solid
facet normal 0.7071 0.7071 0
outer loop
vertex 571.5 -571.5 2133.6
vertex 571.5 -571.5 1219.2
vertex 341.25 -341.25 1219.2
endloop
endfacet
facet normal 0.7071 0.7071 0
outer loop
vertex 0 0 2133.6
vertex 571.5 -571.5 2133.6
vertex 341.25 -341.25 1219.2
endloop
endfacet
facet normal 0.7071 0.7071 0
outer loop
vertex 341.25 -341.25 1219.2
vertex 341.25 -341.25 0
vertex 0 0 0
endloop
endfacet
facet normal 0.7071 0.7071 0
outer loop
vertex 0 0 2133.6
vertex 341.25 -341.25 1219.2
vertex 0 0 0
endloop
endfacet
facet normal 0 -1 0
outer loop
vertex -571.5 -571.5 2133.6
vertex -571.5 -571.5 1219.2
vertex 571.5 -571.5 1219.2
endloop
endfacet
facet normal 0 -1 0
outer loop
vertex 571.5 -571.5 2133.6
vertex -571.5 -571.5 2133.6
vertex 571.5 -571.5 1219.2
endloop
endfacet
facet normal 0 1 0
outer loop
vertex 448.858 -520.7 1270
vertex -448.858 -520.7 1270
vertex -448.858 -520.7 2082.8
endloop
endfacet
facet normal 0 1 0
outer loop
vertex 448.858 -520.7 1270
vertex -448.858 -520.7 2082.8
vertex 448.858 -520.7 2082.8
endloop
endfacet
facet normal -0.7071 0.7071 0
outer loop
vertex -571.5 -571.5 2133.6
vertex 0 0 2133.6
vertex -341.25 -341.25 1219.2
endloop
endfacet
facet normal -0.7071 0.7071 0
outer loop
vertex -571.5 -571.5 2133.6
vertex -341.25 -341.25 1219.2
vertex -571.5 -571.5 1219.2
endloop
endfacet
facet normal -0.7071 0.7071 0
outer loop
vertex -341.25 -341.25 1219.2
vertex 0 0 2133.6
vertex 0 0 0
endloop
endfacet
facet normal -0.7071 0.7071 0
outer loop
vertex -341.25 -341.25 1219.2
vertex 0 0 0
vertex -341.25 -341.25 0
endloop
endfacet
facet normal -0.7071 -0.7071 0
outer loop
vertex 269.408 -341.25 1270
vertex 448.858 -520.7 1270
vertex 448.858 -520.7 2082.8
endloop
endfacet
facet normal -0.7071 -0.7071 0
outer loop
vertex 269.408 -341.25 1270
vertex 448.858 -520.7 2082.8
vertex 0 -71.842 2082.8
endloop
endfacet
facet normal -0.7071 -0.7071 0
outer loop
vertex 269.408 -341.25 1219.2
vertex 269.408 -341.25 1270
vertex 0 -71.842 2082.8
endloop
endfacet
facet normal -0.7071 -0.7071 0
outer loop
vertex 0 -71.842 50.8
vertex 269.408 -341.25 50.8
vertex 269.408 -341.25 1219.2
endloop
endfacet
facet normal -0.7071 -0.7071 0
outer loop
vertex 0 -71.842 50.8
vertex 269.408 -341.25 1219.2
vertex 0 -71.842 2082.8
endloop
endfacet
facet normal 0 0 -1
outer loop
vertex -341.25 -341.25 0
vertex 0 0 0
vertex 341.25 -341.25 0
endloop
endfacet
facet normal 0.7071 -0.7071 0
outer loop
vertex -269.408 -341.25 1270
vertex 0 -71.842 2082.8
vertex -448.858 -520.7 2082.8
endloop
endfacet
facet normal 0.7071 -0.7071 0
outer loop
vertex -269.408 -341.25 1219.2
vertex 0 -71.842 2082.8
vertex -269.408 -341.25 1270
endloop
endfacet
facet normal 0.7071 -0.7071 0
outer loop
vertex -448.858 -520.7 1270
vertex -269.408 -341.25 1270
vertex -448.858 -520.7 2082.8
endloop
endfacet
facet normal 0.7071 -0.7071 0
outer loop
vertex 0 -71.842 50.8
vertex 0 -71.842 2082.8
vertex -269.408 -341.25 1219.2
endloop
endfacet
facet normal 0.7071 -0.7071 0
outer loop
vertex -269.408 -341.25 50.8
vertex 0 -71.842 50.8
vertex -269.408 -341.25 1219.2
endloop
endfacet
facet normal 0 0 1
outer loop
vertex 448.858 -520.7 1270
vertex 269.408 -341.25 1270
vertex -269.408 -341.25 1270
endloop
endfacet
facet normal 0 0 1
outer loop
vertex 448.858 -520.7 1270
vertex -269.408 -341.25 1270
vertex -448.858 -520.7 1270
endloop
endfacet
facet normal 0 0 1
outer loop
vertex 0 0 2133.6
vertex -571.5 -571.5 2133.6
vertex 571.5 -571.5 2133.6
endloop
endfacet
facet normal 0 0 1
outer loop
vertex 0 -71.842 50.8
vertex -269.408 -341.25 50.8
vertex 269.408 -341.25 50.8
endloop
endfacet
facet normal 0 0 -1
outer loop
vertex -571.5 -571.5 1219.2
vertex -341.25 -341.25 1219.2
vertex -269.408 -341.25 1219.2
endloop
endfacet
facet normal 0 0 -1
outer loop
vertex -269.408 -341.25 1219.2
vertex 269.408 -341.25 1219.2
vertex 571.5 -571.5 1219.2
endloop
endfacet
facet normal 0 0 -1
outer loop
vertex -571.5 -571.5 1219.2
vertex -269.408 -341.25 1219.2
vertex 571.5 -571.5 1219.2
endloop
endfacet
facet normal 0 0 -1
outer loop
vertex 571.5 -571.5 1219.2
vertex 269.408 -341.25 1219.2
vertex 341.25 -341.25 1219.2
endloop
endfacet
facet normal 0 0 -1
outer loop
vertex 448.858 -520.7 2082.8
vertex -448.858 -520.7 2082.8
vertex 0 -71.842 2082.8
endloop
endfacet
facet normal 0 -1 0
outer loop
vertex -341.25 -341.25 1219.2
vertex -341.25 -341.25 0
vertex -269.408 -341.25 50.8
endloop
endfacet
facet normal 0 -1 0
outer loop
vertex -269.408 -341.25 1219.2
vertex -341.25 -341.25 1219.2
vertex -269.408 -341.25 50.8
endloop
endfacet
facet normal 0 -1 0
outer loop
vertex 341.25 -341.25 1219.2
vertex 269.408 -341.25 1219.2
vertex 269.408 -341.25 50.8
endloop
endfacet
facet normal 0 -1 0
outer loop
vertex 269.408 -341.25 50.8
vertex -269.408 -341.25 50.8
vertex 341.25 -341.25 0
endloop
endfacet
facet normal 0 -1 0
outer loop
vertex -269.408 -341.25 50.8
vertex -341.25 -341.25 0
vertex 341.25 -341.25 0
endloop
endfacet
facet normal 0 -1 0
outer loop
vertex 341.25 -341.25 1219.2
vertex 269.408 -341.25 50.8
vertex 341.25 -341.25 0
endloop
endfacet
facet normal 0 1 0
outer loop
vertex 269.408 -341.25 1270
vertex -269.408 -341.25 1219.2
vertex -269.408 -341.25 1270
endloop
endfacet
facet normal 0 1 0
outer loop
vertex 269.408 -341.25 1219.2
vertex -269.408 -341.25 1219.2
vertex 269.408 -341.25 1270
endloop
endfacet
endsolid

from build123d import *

# Parameters (mm, degrees)
F1_DEPTH = 1219.2
F3_DEPTH = 914.4
F4_T     = 50.8


# Not quite as in the source:
# - a shell that OpenCascade refuses in one call is made with other operations: the cavity is built on its own and cut out


with BuildPart() as f1:
    # F0 (on Top) → F1 (new body)
    with BuildSketch(Plane.XY):
        Polygon((0, 0), (-341.2497326006, -341.2497326006), (341.2497326006, -341.2497326006), align=None)
    extrude(amount=F1_DEPTH)

    # F2 (on face) → F3 (join)
    with BuildSketch(Plane.XY.offset(1219.2)):
        Polygon((341.2497326006, -341.2497326006), (0, 0), (-341.2497326006, -341.2497326006), align=None)
        Polygon((341.2497326006, -341.2497326006), (-341.2497326006, -341.2497326006), (-571.5, -571.5), (571.5, -571.5), align=None)
    extrude(amount=F3_DEPTH)

    # F4: shell of thickness 50.8, made by hand


with BuildPart() as f4_core1:
    # F4_t2: copy of F1
    add(f1.part)

    # the walls: a layer under each face that stays
    f4_faces = [f4_core1.faces().sort_by_distance(p)[0] for p in [
        (-285.75, -285.75, 1066.8),
        (0, -170.6248663003, 0),
        (0, -456.3748663003, 1219.2),
        (0, -571.5, 1676.4),
        (0, -285.75, 2133.6),
        (285.75, -285.75, 1066.8),
    ]]
    thicken(f4_faces, amount=-F4_T, mode=Mode.SUBTRACT)


with BuildPart() as f1_1:
    add(f1.part)

    # what is left inside the walls is the cavity
    f4_cavity = [f4_core1.part.solids().sort_by_distance(p)[0] for p in [
        (-224.069765, -296.630235, 1405.466667),
    ]]
    add(f4_cavity, mode=Mode.SUBTRACT)


solid = f1_1.part
